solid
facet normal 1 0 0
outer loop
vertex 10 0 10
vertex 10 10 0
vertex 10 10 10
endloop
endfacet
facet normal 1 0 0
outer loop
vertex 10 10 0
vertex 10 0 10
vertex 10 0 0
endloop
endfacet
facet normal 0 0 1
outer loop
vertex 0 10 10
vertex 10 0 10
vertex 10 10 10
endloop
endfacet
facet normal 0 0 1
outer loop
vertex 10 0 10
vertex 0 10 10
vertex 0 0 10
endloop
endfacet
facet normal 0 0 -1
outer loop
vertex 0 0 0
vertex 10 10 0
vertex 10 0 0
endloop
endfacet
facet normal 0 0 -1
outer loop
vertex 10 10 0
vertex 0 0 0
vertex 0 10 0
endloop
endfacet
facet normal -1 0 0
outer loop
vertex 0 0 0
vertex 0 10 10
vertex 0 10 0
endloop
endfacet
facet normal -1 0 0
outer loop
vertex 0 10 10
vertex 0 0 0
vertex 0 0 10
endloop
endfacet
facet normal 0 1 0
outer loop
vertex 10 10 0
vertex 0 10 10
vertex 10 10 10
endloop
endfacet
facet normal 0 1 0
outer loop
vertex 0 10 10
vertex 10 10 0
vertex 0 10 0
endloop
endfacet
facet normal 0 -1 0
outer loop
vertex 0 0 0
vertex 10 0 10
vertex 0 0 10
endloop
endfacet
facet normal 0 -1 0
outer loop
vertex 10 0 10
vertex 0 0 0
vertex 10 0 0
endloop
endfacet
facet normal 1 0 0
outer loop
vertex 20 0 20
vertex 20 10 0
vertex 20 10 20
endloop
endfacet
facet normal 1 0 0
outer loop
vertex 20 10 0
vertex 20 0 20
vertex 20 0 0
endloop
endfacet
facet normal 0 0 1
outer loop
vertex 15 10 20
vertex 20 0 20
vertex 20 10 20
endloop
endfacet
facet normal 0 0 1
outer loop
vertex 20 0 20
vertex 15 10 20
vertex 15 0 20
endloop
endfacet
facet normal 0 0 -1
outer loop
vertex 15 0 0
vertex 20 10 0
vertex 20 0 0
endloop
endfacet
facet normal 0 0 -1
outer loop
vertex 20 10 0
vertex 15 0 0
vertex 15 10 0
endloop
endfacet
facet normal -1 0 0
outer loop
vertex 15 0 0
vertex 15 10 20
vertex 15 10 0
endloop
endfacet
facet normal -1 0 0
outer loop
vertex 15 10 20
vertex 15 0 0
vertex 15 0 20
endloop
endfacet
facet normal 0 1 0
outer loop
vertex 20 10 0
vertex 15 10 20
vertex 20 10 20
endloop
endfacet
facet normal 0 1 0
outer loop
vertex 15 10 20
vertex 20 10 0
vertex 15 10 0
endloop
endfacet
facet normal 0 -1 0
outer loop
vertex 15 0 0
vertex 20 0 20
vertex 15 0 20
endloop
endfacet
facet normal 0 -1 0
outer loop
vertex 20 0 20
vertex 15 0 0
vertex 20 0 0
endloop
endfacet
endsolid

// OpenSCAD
// Unit of length: Unit.MM
union()
{
   cube(size = 10.0, center = false);
   translate(v = [15.0, 0.0, 0.0])
   {
      scale(v = [0.5, 1.0, 2.0])
      {
         cube(size = 10.0, center = false);
      }
   }
}
